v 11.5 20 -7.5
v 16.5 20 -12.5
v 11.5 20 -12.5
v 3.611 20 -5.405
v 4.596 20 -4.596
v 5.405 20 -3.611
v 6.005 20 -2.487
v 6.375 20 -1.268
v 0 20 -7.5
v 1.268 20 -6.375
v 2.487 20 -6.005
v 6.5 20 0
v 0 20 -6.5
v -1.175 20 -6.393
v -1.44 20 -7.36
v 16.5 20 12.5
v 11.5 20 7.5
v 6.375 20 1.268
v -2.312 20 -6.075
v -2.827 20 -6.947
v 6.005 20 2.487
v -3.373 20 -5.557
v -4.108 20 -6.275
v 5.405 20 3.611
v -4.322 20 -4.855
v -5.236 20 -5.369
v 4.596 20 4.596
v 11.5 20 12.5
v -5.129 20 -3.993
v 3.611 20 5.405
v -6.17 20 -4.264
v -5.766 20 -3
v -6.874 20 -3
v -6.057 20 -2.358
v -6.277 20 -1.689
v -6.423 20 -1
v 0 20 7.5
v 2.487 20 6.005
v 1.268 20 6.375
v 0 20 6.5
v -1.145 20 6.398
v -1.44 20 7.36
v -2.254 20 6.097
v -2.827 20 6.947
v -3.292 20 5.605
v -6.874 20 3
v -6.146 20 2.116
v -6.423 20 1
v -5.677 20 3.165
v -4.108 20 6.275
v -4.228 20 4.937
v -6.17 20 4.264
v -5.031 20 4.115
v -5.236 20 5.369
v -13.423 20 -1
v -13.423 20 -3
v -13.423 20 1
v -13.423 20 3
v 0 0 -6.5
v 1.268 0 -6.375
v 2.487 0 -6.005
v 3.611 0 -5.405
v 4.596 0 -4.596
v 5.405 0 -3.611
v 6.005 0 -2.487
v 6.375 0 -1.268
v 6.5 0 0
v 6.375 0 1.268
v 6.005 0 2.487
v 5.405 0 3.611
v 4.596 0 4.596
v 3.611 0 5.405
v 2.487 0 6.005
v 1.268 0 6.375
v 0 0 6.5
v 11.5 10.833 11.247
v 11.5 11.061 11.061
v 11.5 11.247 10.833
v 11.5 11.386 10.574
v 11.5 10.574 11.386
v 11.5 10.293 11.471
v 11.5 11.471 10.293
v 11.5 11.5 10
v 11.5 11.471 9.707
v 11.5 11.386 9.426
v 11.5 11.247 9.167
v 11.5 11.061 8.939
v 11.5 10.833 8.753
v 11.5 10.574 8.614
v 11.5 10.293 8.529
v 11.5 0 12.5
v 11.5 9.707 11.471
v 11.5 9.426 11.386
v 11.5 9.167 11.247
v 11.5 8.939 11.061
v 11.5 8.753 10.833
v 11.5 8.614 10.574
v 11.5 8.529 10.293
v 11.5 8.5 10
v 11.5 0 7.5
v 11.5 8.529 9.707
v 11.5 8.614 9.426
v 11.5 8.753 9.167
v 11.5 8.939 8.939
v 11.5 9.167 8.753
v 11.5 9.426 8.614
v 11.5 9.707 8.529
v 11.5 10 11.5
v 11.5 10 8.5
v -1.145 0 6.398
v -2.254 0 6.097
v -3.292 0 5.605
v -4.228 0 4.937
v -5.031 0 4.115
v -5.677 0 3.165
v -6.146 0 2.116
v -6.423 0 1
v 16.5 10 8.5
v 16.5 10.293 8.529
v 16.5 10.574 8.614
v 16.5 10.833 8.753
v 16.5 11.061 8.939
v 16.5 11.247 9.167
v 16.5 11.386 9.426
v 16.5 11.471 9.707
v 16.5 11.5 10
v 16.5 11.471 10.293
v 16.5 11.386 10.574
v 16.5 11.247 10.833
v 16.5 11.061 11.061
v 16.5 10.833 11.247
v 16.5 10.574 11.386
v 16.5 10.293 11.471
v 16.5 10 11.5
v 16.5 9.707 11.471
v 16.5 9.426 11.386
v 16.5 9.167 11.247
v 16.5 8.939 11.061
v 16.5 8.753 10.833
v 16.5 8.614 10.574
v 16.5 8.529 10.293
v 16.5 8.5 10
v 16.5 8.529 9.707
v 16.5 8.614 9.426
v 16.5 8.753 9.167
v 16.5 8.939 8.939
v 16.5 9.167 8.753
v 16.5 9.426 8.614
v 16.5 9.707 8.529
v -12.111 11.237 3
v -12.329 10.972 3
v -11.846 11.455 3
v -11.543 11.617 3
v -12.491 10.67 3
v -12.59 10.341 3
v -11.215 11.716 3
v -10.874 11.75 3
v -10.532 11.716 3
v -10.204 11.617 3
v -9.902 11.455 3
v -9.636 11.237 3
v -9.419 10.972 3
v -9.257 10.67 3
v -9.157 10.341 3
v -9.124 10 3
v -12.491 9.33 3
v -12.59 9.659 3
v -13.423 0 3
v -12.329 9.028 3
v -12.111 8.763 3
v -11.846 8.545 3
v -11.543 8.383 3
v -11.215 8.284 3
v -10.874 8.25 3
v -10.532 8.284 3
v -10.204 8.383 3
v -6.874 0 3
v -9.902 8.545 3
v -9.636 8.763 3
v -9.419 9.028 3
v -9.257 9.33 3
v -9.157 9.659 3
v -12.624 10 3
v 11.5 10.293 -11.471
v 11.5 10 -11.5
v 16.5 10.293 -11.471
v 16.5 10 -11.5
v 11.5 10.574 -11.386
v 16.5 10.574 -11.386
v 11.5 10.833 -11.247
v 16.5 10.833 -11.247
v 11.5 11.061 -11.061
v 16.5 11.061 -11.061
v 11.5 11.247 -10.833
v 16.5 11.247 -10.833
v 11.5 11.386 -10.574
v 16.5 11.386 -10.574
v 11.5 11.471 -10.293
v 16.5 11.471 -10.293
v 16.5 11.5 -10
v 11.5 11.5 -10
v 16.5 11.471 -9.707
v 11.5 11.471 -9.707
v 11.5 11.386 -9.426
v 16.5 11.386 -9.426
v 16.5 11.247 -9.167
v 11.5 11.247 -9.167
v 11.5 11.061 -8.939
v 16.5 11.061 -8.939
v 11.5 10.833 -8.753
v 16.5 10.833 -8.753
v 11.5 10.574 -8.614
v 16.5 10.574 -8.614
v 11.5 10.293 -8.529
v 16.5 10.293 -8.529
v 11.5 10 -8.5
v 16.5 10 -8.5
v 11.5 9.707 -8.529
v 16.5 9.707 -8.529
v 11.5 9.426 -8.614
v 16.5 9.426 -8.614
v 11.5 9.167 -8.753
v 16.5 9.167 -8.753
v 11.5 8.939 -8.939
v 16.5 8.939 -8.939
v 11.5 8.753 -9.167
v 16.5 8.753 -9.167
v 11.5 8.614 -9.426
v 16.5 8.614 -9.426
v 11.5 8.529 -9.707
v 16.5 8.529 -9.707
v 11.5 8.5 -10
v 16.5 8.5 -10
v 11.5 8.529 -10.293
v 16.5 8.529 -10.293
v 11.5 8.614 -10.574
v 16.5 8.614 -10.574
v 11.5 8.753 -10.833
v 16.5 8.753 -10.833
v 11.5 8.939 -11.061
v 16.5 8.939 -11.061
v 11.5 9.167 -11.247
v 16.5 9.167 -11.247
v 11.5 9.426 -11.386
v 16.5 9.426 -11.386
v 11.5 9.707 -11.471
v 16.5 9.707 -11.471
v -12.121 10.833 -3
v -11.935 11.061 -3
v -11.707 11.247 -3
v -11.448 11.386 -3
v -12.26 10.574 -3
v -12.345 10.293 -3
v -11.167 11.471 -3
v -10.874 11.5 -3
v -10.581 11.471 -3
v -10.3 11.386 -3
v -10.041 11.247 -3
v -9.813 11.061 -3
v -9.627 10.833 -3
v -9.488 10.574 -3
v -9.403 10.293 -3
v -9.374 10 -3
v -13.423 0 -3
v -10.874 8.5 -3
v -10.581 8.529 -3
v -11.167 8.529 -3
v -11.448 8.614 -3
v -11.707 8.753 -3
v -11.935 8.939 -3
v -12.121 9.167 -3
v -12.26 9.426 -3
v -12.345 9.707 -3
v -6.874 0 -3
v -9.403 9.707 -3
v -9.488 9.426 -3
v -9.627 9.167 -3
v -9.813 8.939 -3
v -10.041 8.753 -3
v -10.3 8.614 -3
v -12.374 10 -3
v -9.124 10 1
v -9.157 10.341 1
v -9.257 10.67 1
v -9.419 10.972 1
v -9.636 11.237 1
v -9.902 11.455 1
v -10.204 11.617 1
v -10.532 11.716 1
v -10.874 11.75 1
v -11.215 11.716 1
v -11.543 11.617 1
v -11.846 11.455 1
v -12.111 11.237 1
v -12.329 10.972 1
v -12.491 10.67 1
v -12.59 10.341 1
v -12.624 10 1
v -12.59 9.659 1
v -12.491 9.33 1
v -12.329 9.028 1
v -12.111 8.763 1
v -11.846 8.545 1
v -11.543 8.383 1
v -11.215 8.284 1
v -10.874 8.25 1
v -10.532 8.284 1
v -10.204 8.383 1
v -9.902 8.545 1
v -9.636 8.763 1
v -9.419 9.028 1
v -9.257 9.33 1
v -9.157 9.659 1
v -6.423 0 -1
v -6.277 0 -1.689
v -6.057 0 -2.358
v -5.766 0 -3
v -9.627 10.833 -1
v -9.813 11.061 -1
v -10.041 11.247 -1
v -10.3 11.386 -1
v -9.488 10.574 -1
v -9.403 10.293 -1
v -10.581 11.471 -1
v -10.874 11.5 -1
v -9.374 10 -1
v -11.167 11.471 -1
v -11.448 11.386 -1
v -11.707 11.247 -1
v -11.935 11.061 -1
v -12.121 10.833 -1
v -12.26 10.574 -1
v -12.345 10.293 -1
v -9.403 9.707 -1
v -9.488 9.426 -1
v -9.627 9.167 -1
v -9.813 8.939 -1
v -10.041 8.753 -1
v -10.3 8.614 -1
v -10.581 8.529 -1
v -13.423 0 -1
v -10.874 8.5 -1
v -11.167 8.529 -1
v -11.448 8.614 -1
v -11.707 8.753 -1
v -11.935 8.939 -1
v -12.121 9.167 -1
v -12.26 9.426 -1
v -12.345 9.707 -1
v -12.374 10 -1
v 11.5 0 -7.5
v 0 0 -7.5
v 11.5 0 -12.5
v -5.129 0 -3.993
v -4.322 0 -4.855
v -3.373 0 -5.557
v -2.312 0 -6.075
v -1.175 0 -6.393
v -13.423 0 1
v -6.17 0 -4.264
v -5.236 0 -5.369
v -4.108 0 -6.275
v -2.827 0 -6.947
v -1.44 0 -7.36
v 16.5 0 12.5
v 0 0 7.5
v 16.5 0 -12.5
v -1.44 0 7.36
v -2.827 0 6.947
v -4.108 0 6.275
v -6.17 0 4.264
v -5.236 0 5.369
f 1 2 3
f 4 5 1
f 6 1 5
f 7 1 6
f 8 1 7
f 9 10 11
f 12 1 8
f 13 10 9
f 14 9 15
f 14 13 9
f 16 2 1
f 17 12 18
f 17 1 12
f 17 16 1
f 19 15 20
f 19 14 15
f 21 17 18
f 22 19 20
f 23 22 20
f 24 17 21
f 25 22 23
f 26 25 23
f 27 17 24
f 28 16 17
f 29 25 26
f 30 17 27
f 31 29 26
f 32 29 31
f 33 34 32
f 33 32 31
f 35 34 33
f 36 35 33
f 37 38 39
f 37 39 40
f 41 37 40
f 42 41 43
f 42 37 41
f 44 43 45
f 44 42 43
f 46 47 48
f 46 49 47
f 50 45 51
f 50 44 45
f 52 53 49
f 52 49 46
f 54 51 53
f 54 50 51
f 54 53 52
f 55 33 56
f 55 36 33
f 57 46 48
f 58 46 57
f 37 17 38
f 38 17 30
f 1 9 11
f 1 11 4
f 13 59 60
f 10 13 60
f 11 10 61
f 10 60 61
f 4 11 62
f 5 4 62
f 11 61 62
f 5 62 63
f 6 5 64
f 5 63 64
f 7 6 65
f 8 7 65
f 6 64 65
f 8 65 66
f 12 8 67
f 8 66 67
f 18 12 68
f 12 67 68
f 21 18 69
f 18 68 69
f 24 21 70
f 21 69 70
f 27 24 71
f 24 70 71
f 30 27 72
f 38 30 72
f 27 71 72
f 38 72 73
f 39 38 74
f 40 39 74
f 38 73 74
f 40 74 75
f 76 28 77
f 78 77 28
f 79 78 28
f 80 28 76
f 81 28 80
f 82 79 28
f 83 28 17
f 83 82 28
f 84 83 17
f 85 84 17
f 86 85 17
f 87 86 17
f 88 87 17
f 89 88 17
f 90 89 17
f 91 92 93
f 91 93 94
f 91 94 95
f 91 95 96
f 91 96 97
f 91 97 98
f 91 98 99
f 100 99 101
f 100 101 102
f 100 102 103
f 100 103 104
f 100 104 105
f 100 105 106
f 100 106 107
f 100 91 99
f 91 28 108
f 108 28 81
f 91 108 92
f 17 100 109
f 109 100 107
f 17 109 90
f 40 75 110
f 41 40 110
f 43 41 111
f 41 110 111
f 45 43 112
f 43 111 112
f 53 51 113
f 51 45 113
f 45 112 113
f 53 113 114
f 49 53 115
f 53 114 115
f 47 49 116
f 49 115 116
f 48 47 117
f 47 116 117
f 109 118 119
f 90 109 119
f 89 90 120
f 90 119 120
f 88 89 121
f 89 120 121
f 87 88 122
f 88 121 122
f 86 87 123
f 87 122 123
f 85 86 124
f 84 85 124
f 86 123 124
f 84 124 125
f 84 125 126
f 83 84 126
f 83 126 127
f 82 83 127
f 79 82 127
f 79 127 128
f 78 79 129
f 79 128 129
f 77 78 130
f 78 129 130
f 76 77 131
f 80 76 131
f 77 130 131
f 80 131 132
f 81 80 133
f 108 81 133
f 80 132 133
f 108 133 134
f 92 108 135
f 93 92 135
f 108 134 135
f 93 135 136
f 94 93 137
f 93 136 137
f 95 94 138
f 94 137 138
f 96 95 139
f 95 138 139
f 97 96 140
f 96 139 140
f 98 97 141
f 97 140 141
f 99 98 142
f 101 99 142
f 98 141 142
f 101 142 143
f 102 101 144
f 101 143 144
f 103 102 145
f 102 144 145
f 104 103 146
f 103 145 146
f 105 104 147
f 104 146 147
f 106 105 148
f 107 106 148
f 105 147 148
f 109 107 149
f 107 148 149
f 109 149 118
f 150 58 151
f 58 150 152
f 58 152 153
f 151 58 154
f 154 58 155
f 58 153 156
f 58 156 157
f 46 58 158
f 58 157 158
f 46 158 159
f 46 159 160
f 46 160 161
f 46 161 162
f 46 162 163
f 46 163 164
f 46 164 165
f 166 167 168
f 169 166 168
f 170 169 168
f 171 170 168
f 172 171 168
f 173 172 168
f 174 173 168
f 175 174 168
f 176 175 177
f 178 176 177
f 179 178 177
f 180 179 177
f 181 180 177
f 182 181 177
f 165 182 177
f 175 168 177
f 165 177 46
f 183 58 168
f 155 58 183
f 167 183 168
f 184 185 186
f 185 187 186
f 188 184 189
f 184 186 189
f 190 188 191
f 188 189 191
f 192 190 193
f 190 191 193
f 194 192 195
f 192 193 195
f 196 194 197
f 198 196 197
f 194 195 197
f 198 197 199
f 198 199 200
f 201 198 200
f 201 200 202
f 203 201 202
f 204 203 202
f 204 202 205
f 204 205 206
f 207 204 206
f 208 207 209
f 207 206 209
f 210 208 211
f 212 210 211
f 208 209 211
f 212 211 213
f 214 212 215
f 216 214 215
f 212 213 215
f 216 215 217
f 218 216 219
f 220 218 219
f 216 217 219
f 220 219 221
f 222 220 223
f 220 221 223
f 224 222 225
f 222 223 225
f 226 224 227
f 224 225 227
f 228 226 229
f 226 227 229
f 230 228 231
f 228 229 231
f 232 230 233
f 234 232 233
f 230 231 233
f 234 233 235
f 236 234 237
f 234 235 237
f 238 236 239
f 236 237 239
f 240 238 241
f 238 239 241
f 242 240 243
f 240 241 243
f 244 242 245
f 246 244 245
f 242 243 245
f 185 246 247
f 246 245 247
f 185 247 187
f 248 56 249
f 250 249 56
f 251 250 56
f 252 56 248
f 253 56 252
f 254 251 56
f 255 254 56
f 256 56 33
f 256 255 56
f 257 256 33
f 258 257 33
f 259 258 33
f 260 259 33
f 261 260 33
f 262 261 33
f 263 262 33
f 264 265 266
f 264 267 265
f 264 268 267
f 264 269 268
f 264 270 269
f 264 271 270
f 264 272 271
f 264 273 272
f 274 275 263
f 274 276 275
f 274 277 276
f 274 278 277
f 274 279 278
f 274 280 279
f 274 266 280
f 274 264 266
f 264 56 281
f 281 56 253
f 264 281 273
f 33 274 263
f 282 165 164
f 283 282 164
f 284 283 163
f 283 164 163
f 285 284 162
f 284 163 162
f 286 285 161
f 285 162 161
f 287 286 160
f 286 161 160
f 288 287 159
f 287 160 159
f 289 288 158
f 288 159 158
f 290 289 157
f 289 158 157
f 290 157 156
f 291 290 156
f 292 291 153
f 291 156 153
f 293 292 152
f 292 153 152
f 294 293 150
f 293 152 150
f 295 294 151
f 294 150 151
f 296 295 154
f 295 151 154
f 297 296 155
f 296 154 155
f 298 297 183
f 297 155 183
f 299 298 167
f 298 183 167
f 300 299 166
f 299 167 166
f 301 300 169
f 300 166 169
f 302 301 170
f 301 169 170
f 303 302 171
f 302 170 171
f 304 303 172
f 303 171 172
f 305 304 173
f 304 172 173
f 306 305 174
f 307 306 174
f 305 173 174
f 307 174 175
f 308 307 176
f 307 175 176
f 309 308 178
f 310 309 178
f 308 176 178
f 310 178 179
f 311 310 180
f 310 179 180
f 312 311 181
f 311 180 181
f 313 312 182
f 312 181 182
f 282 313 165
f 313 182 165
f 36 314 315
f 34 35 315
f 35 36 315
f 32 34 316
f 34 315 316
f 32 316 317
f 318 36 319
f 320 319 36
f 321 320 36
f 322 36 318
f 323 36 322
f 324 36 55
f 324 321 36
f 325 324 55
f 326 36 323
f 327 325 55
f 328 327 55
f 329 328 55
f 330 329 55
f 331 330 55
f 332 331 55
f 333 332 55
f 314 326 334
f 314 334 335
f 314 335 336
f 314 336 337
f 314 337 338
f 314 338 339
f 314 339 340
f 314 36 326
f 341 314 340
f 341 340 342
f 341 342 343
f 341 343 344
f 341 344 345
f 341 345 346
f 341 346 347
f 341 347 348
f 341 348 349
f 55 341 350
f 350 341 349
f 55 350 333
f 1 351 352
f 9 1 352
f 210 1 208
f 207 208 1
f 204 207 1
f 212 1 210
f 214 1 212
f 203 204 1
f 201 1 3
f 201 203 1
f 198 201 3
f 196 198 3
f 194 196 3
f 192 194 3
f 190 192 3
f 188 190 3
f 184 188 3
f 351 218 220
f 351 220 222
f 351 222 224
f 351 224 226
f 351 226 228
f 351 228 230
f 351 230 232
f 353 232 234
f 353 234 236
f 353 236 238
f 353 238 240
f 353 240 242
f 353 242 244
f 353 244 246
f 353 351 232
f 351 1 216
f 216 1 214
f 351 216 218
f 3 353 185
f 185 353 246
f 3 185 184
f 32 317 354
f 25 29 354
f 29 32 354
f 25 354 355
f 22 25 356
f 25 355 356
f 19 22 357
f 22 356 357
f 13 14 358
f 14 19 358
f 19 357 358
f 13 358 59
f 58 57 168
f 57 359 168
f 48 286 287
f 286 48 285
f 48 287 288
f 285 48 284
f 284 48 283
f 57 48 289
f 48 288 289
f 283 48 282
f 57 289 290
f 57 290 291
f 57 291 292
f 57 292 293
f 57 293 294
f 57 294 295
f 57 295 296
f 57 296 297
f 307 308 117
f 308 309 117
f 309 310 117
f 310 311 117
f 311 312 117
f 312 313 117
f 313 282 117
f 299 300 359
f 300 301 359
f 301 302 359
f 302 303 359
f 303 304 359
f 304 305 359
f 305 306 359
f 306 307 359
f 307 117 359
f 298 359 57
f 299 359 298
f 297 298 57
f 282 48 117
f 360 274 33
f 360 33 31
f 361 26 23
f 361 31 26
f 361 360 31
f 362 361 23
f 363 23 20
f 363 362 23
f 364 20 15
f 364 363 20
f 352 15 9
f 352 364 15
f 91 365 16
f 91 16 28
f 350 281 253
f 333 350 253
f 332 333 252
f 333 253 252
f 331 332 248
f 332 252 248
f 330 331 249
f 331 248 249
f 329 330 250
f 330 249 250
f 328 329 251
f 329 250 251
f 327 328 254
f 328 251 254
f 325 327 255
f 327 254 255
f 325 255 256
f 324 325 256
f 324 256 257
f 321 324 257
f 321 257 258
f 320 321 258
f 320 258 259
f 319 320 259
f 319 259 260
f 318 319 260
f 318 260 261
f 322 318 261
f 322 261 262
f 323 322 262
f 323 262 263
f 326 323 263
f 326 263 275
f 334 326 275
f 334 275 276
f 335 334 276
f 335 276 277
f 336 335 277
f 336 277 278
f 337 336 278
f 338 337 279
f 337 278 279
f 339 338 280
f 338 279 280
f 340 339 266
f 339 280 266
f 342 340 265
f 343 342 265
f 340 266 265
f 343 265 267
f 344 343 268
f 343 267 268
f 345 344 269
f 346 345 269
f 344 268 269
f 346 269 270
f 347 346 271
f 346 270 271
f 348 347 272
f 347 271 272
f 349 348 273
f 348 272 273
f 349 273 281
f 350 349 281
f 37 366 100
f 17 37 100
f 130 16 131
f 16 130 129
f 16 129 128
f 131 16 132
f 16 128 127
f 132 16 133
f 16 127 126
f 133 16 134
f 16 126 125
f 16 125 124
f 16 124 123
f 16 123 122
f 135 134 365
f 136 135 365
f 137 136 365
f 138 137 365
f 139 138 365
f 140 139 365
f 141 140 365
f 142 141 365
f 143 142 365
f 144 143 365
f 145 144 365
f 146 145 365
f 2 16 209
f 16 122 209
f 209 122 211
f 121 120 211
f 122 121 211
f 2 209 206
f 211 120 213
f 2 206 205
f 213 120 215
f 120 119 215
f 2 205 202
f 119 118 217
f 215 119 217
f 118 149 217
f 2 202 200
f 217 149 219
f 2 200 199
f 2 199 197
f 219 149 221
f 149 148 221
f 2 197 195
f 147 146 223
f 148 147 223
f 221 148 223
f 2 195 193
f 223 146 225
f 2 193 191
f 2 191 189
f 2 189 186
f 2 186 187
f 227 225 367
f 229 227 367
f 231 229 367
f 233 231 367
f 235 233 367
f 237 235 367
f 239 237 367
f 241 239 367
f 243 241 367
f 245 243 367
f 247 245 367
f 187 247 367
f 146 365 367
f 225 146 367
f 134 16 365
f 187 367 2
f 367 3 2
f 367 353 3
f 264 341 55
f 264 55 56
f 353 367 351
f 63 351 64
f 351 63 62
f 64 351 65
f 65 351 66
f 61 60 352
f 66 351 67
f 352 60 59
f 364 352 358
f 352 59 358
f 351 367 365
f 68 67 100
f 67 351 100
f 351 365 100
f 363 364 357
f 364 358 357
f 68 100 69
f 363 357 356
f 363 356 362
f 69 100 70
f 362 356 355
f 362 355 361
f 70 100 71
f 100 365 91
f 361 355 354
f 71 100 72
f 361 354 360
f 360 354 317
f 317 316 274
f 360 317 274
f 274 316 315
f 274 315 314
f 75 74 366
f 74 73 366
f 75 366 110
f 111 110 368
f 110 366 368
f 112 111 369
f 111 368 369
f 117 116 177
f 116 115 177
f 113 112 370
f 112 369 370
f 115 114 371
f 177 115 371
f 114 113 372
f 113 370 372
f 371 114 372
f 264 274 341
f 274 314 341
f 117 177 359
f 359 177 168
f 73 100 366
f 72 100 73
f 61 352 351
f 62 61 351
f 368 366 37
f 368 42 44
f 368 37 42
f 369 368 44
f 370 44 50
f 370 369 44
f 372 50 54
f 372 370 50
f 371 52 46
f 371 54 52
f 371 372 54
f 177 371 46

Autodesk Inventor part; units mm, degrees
ref_plane "YZ Plane" through (0, 0, 0) normal (1, 0, 0) x (0, 1, 0)
ref_plane "XZ Plane" through (0, 0, 0) normal (0, 1, 0) x (-1, 0, 0)
ref_plane "XY Plane" through (0, 0, 0) normal (0, 0, 1) x (1, 0, 0)
sketch "Sketch1" plane through (0, 0, 0) normal (0, 1, 0) x (-1, 0, 0)
  arc A0 (0, 6.5) -> (0, -6.5) centre (0, 0) ccw
  arc A1 (7.433, 1) -> (6.8739, 3) centre (0, 0) ccw
  line L0 (0, 7.5) -> (-16.5, 7.5)
  line L1 (-16.5, 7.5) -> (-16.5, -7.5)
  line L2 (-16.5, -7.5) -> (0, -7.5)
  line L3 (0, -7.5) -> (0, -6.5)
  line L4 (-16.5, 12.5) -> (-11.5, 12.5)
  line L5 (-11.5, 12.5) -> (-11.5, 7.5)
  line L6 (-11.5, 7.5) -> (-16.5, 7.5)
  line L7 (-16.5, 7.5) -> (-16.5, 12.5)
  line L8 (-16.5, -7.5) -> (-11.5, -7.5)
  line L9 (-11.5, -7.5) -> (-11.5, -12.5)
  line L10 (-11.5, -12.5) -> (-16.5, -12.5)
  line L11 (-16.5, -12.5) -> (-16.5, -7.5)
  line L12 (6.4226, 1) -> (13.4226, 1)
  line L13 (13.4226, 1) -> (13.4226, 3)
  line L14 (13.4226, 3) -> (6.4226, 3)
  line L15 (6.4226, 3) -> (6.4226, 1)
  line L16 (0, 0) -> (-6.5, 0)
  line L17 (6.4226, -1) -> (13.4226, -1)
  line L18 (13.4226, -1) -> (13.4226, -3)
  line L19 (13.4226, -3) -> (6.4226, -3)
  line L20 (6.4226, -3) -> (6.4226, -1)
  arc A2 (7.433, -1) -> (7.5, 0) centre (0, 0) ccw
  arc A3 (6.8739, 3) -> (6.8739, -3) centre (0, 0) ccw
  arc A4 (6.4226, 1) -> (0, 6.5) centre (0, 0) ccw
  arc A5 (7.5, 0) -> (7.433, 1) centre (0, 0) ccw
  arc A6 (6.4226, -1) -> (6.5, 0) centre (0, 0) ccw
  arc A7 (6.8739, -3) -> (7.433, -1) centre (0, 0) ccw
  arc A8 (0, -6.5) -> (5.7663, -3) centre (0, 0) ccw
  line L21 (0, -6.5) -> (0, 6.5)
  line L22 (0, 6.5) -> (0, 7.5)
  arc A9 (5.7663, -3) -> (6.4226, -1) centre (0, 0) ccw
  arc A10 (6.5, 0) -> (6.4226, 1) centre (0, 0) ccw
  dimension "d0" = 13
  dimension "d1" = 15
  dimension "d2" = 15
  dimension "d3" = 16.5
  dimension "d4" = 5
  dimension "d5" = 5
  dimension "d6" = 5
  dimension "d7" = 5
  dimension "d8" = 1
  dimension "d9" = 2
  dimension "d10" = 7
extrude "Extrusion1" add sketch "Sketch1" along normal blind 20 contours L22 A3 L14 L15 A4 | A0 L3 A3 L22 | L15 L14 A1 L12 | A3 L2 L1 L0 | A8 A9 L20 L19 A3 L3 | A1 L14 L13 L12 | L0 L7 L4 L5 | L17 A7 L19 L20 | L9 L10 L11 L2 | A7 L17 L18 L19
sketch "Sketch2" plane through (16.5, 0, 12.5) normal (1, 0, 0) x (0, 0, -1)
  circle A0 centre (22.5, 10) radius 1.5
  line L0 (12.5, 0) -> (12.5, 20)
  line L1 (11.5, 0) -> (11.5, 20) projected
  line L2 (0, 0) -> (25, 0) projected
  circle A1 centre (2.5, 10) radius 1.5
  dimension "d13" = 3
  dimension "d14" = 10
  dimension "d15" = 10
extrude "Extrusion2" cut sketch "Sketch2" against normal up to next
sketch "Sketch3" plane through (-13.4226, 0, 3) normal (0, 0, 1) x (1, 0, 0)
  circle A0 centre (2.5488, 10) radius 1.75
  line L0 (6.5488, 20) -> (6.5488, 0) projected
  line L1 (0, 0) -> (6.5488, 0) projected
  point P0 (13.4226, 0)
  dimension "d18" = 4
  dimension "d19" = 3.5
  dimension "d20" = 10
extrude "Extrusion3" cut sketch "Sketch3" against normal up to next
sketch "Sketch4" plane through (-6.8739, 0, -3) normal (0, 0, -1) x (-1, 0, 0)
  circle A0 centre (4, 10) radius 1.5
  line L0 (0, 0) -> (0, 20) projected
  line L1 (0, 0) -> (6.5488, 0) projected
  point P0 (-6.8739, 0)
  dimension "d23" = 4
  dimension "d24" = 10
  dimension "d25" = 3
extrude "Extrusion4" cut sketch "Sketch4" against normal up to next
properties part number "round_adaptor_13"
